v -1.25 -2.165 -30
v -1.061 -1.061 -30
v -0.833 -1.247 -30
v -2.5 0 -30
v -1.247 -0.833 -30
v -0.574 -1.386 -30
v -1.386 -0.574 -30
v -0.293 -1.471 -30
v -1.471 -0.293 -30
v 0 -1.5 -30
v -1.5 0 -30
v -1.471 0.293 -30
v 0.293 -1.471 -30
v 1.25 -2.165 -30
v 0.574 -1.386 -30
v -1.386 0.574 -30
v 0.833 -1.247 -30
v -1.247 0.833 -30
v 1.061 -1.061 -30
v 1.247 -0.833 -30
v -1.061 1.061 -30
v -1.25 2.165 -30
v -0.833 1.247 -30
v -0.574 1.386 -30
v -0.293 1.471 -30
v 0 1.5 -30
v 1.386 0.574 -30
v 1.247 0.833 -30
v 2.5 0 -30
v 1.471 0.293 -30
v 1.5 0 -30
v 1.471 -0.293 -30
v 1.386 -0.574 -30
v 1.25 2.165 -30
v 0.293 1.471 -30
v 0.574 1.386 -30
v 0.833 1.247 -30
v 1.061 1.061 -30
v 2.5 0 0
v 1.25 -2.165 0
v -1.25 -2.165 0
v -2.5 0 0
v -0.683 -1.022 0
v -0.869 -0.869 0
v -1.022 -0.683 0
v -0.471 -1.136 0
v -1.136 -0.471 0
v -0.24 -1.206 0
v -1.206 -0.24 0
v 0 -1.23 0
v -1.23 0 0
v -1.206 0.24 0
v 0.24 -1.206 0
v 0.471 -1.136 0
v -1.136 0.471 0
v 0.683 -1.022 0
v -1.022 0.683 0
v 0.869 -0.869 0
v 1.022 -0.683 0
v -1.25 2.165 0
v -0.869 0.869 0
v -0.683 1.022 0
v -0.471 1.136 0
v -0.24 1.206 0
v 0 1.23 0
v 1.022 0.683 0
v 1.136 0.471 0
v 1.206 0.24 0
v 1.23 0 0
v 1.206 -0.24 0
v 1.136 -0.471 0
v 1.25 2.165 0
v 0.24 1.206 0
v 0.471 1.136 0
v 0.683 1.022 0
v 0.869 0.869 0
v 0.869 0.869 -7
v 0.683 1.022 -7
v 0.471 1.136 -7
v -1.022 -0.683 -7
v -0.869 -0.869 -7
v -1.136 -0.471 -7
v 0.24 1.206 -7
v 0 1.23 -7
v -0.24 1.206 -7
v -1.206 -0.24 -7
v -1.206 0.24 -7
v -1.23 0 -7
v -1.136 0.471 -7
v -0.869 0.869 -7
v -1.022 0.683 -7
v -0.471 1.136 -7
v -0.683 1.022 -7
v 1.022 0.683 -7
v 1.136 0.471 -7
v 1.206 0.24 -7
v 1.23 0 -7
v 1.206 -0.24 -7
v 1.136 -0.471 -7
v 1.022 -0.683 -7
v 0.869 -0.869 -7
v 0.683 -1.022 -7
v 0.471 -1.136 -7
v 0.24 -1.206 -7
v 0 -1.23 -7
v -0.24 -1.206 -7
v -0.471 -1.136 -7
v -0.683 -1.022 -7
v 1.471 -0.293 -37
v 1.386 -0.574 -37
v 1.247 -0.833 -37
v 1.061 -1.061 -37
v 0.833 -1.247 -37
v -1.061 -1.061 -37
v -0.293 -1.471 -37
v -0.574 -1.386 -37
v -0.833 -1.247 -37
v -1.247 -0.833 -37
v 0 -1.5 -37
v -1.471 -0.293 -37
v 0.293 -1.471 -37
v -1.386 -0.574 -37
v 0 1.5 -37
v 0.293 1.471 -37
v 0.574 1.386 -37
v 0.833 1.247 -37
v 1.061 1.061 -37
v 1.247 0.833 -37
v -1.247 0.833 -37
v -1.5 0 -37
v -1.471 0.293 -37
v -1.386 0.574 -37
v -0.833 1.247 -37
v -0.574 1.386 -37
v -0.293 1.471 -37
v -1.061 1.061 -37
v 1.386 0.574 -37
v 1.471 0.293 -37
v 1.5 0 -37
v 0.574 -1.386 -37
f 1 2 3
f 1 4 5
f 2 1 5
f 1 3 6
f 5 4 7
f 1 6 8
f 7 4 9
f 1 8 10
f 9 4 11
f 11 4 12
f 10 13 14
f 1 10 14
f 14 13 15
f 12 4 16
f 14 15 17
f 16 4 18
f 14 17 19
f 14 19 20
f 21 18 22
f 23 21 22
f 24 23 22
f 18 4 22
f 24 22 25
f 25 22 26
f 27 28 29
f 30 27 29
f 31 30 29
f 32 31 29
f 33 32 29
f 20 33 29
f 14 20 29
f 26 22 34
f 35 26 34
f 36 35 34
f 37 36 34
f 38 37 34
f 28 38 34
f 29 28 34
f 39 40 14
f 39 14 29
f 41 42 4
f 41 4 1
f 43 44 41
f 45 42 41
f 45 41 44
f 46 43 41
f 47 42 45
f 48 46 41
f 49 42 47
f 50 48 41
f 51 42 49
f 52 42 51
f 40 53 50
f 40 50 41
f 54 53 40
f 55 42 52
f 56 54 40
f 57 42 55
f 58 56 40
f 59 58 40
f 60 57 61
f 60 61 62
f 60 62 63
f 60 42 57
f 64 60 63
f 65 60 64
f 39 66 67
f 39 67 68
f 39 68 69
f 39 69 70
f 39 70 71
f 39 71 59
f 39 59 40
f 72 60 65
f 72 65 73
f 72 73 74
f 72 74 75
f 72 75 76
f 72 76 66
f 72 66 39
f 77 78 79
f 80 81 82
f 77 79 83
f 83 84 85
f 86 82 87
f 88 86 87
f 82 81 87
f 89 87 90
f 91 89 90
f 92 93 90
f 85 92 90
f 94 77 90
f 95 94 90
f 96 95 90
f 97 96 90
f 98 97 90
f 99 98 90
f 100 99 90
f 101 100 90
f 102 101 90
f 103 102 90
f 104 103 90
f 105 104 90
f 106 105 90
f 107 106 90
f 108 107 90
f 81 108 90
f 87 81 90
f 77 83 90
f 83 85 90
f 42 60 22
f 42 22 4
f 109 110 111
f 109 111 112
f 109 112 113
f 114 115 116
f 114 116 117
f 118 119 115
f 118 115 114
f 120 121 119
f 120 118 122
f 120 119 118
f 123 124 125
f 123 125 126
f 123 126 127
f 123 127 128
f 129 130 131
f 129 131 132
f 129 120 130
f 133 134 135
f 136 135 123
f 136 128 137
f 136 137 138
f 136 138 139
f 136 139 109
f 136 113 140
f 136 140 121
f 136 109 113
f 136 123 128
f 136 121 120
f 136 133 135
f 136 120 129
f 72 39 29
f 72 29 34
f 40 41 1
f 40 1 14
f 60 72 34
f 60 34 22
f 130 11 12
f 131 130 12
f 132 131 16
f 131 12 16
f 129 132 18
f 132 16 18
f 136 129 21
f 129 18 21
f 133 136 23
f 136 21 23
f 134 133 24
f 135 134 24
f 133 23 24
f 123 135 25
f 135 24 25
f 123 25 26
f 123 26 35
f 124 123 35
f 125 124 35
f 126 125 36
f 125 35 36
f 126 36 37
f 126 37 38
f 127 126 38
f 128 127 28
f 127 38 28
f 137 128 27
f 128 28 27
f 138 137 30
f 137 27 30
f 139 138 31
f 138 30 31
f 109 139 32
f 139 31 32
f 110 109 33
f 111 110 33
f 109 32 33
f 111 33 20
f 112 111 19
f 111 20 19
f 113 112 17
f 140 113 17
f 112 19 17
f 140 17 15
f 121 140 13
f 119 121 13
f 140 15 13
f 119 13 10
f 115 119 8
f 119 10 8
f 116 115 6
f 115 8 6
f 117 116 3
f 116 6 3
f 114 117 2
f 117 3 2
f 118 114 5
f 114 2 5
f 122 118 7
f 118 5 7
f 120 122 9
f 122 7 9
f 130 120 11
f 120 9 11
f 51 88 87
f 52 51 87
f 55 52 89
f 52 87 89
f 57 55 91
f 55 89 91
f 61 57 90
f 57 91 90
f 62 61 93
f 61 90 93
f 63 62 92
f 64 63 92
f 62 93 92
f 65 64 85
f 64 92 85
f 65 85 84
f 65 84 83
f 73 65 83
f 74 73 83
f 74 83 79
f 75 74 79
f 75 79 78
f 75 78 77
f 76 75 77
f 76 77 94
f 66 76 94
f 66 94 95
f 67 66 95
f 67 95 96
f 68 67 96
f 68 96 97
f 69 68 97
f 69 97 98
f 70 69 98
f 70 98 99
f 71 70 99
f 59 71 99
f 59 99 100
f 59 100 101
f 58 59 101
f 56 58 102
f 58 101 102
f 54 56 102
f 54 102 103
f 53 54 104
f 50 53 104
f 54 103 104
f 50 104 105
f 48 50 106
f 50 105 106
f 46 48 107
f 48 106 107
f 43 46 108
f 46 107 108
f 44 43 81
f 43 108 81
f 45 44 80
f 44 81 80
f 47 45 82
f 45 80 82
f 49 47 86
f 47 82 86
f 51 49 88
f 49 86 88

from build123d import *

# Parameters (mm, degrees)
ESTRUSIONE_ESTRUSIONE1_DEPTH = 30
SCHIZZO2_R                   = 1.5
ESTRUSIONE_ESTRUSIONE2_DEPTH = 7
FORO1_D                      = 2.459
FORO1_DEPTH                  = 7


with BuildPart() as part:
    # Schizzo1 → Estrusione-Estrusione1 (new body)
    with BuildSketch(Plane.XY):
        Polygon((1.25, -2.165063509), (2.5, 0), (1.25, 2.165063509), (-1.25, 2.165063509), (-2.5, 0), (-1.25, -2.165063509), align=None)
    extrude(amount=-ESTRUSIONE_ESTRUSIONE1_DEPTH)

    # Schizzo2 → Estrusione-Estrusione2 (add)
    with BuildSketch(Plane(origin=(0, 0, -30), x_dir=(-1, 0, 0), z_dir=(0, 0, -1))):
        Circle(SCHIZZO2_R)
    extrude(amount=ESTRUSIONE_ESTRUSIONE2_DEPTH)

    # Foro1
    with Locations(Plane.XY):
        with Locations((0, 0)):
            Hole(FORO1_D / 2, depth=FORO1_DEPTH)


solid = part.part
